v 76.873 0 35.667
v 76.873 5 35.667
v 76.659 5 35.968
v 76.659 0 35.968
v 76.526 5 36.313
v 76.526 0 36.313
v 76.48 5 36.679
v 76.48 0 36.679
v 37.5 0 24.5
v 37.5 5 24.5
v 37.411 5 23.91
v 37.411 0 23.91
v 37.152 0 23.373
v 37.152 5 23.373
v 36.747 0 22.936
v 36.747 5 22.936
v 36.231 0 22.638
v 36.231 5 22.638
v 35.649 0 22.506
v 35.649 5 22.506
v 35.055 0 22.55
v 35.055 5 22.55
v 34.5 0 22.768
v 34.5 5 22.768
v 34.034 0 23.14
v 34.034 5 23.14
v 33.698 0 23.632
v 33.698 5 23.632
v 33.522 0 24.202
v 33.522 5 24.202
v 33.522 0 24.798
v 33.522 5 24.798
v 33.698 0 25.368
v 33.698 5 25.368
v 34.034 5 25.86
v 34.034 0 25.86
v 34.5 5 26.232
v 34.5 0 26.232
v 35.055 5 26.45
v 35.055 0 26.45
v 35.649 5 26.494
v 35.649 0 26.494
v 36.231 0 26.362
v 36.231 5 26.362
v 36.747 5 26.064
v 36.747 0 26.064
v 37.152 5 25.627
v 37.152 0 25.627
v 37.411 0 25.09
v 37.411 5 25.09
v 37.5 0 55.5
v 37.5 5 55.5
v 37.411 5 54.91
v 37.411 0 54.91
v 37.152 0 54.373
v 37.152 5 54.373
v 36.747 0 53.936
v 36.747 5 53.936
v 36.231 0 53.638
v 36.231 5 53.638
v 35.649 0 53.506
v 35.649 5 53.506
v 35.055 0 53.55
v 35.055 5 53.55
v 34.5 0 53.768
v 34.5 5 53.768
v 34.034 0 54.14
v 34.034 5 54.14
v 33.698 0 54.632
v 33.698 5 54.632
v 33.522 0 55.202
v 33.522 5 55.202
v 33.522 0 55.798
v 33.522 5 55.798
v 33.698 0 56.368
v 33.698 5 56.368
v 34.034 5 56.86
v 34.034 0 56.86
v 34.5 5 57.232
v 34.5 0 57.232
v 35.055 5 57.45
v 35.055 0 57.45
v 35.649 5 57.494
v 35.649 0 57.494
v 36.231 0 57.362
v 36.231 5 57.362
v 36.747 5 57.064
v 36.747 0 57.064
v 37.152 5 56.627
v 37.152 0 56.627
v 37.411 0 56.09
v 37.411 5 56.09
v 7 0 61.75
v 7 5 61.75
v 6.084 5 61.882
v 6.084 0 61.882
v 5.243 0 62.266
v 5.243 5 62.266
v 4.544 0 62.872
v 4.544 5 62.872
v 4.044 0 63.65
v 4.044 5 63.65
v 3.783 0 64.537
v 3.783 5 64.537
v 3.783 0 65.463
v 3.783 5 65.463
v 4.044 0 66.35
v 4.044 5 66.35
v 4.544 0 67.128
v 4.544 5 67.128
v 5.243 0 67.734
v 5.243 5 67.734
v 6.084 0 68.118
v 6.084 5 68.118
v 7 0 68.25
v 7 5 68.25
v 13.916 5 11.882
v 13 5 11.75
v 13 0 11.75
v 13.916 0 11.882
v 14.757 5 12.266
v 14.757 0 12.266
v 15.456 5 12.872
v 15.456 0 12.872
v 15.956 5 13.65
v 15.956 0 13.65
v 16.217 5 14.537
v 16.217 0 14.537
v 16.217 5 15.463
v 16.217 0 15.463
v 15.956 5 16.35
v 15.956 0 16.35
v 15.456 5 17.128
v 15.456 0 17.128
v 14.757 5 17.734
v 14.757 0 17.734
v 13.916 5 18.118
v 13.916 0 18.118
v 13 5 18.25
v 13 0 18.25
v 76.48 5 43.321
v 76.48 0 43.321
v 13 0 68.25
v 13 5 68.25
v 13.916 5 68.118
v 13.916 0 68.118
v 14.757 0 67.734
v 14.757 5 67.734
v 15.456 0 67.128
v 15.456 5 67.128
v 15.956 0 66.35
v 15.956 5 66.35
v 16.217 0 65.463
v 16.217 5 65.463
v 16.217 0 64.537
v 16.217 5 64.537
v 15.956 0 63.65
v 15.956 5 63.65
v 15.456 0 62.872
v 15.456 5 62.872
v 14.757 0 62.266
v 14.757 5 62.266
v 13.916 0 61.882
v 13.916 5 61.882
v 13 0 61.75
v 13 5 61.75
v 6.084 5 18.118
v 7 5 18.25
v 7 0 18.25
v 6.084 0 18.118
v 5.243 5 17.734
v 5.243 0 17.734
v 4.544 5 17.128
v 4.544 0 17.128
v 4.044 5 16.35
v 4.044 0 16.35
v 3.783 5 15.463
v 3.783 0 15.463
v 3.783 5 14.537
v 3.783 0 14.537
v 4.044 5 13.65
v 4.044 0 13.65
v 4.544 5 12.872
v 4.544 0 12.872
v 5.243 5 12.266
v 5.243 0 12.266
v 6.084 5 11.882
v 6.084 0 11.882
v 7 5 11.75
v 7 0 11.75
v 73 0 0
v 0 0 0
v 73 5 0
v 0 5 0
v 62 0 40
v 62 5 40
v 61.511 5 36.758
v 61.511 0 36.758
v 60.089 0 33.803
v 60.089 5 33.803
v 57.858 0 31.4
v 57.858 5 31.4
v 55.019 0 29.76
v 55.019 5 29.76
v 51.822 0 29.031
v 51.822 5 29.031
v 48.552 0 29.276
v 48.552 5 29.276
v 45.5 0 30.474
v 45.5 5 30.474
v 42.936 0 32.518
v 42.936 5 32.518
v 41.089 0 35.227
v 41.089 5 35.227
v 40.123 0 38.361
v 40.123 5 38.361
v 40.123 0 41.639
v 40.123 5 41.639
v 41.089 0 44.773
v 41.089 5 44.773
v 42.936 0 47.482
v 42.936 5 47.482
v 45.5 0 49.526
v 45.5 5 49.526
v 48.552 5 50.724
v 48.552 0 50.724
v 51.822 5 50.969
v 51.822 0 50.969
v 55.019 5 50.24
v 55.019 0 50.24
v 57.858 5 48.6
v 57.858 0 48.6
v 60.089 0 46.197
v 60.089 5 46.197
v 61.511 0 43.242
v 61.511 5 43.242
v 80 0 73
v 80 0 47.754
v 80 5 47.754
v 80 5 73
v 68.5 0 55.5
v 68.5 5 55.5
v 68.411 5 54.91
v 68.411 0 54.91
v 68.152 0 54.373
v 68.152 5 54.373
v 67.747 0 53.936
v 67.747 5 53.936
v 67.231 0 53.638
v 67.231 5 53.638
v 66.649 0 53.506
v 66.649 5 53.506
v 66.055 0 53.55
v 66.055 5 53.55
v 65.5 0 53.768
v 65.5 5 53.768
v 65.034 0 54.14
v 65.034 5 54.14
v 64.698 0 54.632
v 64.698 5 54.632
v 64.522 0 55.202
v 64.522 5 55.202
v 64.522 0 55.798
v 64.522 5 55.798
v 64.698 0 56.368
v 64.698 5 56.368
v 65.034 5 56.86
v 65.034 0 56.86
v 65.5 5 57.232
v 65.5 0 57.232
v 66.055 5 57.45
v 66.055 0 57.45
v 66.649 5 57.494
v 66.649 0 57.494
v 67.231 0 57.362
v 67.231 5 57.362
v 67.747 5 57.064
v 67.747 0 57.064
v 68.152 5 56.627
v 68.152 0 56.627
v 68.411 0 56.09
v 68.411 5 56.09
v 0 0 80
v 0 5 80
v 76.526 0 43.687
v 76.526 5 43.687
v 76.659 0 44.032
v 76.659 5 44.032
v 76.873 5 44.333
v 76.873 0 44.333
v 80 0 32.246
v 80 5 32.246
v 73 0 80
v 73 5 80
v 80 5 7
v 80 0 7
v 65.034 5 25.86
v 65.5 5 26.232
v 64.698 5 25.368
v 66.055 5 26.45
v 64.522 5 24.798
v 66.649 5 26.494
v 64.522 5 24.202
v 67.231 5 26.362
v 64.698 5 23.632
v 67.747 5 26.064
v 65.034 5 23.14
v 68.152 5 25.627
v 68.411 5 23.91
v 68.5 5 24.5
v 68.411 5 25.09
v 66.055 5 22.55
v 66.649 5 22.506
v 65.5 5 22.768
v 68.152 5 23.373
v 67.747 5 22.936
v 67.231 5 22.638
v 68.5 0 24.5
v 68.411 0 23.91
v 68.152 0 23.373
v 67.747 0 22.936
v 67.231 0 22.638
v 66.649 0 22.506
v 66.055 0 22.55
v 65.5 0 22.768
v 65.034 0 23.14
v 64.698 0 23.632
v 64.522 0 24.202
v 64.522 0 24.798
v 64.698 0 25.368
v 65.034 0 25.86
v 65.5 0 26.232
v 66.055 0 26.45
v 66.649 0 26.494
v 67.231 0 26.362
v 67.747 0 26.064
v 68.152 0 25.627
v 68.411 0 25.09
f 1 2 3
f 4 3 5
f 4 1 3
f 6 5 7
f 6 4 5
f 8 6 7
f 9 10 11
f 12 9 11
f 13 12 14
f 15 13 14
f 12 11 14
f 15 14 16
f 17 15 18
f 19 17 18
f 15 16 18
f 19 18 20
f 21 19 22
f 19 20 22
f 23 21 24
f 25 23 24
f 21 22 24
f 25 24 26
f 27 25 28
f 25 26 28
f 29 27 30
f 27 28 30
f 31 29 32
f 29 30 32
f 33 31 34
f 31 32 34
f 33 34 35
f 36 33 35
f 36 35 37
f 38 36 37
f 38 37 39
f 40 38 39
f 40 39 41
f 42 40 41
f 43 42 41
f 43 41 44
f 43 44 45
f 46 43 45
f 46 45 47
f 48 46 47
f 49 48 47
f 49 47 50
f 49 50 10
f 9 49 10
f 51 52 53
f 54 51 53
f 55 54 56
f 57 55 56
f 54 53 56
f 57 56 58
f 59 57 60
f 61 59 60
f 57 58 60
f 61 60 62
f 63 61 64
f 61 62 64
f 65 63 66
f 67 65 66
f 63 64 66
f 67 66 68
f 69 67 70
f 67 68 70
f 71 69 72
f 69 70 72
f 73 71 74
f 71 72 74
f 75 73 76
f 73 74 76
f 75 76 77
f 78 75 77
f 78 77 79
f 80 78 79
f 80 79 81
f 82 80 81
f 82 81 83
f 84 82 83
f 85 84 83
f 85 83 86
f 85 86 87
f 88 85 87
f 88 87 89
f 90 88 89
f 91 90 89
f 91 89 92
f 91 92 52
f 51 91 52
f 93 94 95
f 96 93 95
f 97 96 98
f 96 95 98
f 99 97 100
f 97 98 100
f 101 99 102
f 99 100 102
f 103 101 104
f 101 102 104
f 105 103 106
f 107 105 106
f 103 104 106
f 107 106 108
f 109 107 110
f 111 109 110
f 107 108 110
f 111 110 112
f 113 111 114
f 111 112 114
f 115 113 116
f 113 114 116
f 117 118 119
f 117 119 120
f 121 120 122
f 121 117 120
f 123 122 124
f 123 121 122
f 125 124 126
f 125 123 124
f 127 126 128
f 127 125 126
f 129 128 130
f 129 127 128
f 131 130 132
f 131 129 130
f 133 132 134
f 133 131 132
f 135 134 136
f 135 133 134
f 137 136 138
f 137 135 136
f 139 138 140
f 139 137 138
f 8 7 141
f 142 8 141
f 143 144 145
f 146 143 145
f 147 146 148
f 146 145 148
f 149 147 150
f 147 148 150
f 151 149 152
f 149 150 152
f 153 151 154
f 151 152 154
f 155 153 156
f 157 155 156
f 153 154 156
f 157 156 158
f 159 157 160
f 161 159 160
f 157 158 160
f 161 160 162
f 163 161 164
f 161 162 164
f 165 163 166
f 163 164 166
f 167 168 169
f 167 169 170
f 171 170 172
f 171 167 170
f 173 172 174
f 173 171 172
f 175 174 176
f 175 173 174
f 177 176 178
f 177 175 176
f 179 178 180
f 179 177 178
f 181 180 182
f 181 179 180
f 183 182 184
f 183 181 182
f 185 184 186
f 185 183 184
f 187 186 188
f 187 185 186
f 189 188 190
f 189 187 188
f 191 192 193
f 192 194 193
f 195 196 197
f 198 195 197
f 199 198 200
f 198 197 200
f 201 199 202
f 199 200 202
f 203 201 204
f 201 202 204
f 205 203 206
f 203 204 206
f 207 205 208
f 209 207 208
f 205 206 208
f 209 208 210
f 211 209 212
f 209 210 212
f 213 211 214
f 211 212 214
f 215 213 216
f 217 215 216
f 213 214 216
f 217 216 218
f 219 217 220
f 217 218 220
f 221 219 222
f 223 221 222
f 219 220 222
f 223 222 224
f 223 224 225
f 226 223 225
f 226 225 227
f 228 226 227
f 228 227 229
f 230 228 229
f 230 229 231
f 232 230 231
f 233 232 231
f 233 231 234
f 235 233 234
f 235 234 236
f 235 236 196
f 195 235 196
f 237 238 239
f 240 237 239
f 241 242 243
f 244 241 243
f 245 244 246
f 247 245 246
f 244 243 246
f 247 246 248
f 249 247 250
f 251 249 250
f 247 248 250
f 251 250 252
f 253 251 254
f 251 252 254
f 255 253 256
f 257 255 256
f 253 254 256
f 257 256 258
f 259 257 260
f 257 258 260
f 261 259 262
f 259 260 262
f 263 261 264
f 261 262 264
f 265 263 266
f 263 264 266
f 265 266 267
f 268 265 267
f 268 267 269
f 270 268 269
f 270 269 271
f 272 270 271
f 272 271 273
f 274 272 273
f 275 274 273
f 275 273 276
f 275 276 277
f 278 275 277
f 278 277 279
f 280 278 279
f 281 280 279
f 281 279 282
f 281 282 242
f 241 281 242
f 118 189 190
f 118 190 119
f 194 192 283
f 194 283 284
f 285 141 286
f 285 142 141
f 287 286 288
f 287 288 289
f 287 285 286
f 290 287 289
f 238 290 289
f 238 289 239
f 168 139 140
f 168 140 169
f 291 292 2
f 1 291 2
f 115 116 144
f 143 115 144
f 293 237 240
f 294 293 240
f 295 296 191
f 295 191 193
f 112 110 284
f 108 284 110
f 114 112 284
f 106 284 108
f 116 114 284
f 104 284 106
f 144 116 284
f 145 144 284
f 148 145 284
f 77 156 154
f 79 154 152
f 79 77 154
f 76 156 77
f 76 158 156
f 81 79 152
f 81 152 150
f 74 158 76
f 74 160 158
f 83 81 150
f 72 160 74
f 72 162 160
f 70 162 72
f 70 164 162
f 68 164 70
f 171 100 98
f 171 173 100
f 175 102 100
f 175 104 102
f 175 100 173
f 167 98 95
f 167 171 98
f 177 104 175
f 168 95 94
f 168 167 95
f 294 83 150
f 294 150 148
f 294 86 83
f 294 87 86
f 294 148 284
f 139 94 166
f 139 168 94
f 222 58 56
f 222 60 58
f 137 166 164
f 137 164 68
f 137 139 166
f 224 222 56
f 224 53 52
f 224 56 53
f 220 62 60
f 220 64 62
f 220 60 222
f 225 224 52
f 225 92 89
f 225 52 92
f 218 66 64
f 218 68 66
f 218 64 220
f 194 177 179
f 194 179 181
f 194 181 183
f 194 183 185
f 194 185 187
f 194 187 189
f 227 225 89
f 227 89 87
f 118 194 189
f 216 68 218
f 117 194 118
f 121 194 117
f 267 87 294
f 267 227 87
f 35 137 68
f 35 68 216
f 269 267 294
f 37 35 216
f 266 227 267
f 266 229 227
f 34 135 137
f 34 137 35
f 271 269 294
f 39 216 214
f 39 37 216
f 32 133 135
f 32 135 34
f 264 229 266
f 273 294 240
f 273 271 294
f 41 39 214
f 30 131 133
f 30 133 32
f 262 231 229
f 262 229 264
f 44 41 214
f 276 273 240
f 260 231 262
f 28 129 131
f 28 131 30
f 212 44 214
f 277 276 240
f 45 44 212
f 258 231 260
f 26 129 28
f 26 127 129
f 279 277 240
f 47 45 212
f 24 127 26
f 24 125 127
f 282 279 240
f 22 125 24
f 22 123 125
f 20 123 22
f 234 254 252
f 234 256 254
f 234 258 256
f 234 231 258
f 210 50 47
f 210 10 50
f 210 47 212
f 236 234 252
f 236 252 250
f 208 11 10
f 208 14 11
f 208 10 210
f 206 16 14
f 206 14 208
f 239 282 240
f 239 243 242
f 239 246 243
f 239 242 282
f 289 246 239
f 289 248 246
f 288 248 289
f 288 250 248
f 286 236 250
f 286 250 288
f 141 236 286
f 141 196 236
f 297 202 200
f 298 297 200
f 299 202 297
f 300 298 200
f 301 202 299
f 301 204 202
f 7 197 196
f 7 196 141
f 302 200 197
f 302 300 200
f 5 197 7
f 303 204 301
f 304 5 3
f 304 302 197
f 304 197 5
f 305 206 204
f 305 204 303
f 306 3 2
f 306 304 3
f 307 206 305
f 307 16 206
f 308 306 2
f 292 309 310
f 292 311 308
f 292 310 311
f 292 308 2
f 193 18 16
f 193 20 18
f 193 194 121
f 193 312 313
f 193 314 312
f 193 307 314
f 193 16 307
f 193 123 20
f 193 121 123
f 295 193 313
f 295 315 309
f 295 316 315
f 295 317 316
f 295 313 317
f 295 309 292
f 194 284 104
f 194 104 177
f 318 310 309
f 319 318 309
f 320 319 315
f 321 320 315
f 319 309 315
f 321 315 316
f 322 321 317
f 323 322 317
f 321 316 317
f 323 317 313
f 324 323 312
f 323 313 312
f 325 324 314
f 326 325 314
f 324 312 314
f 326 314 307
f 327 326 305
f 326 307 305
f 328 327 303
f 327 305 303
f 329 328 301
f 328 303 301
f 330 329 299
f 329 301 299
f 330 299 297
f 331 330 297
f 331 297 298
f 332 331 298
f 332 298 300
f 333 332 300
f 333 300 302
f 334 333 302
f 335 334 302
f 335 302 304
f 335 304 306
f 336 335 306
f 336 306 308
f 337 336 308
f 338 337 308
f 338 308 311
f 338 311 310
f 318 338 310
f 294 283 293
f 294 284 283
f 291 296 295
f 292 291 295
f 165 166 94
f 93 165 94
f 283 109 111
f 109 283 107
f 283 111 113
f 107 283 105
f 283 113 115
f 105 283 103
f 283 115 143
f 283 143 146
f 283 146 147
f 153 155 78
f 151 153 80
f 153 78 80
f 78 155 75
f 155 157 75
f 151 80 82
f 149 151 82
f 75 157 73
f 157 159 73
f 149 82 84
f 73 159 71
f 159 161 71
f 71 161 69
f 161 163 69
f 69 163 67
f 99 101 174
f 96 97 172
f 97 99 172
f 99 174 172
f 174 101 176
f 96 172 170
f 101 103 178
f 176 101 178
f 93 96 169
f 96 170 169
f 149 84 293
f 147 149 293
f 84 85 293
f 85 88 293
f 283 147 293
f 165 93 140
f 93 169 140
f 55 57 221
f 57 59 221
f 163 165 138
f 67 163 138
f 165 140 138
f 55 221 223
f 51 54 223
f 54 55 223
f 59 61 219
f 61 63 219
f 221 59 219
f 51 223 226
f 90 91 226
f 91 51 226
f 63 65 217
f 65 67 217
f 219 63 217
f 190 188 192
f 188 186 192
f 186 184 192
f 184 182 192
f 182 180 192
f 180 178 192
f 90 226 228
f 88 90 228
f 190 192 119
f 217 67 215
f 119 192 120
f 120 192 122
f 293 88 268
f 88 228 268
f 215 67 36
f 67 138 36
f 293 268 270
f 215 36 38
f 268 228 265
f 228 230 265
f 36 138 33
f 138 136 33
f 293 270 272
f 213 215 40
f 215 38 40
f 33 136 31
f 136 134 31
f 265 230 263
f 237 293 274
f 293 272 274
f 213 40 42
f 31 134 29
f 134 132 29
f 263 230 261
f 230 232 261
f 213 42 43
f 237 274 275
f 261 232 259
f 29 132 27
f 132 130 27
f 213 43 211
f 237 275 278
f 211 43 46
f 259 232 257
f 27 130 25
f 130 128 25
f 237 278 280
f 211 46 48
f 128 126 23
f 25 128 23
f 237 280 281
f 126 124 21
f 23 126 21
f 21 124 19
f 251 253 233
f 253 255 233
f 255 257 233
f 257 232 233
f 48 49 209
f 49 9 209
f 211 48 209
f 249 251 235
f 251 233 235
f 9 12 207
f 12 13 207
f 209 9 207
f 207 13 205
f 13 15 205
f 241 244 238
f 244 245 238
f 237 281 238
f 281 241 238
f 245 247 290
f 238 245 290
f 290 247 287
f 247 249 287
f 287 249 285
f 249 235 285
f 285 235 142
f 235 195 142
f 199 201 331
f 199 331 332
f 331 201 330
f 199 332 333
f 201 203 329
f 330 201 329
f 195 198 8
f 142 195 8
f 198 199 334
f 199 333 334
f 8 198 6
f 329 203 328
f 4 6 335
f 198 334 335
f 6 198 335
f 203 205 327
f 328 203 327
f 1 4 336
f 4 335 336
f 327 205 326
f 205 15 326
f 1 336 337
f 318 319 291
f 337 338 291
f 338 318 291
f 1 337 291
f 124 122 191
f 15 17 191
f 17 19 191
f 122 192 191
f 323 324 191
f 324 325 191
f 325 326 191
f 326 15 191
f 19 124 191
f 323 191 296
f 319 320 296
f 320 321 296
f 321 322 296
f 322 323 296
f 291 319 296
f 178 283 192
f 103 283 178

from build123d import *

# Parameters (mm, degrees)
SCHIZZO1_W                   = 80
SCHIZZO1_H                   = 5
ESTRUSIONE_ESTRUSIONE1_DEPTH = 80
SCHIZZO4_R                   = 11
TAGLIO_ESTRUSIONE1_DEPTH     = 6
SCHIZZO6_R                   = 2
TAGLIO_ESTRUSIONE3_DEPTH     = 6
CHAMFER1_SIZE                = 7
CUT_EXTRUDE1_DEPTH           = 6
CUT_EXTRUDE2_DEPTH           = 6
FILLET1_R                    = 1.5
FILLET2_R                    = 1.5


with BuildPart() as part:
    # Schizzo1 → Estrusione-Estrusione1 (new body)
    with BuildSketch(Plane.XY):
        with Locations((40, 2.5)):
            Rectangle(SCHIZZO1_W, SCHIZZO1_H)
    extrude(amount=ESTRUSIONE_ESTRUSIONE1_DEPTH)

    # Schizzo4 → Taglio-Estrusione1 (cut, through all)
    with BuildSketch(Plane(origin=(0, 5, 0), x_dir=(1, 0, 0), z_dir=(0, 1, 0))):
        with Locations((51, -40)):
            Circle(SCHIZZO4_R)
    extrude(amount=-TAGLIO_ESTRUSIONE1_DEPTH, mode=Mode.SUBTRACT)

    # Schizzo6 → Taglio-Estrusione3 (cut, through all)
    with BuildSketch(Plane(origin=(0, 5, 0), x_dir=(1, 0, 0), z_dir=(0, 1, 0))):
        with Locations((35.5, -24.5)):
            Circle(SCHIZZO6_R)
        with Locations((66.5, -24.5)):
            Circle(SCHIZZO6_R)
        with Locations((66.5, -55.5)):
            Circle(SCHIZZO6_R)
        with Locations((35.5, -55.5)):
            Circle(SCHIZZO6_R)
    extrude(amount=-TAGLIO_ESTRUSIONE3_DEPTH, mode=Mode.SUBTRACT)

    # Chamfer1
    chamfer1_edges = [part.edges().sort_by_distance(p)[0] for p in [
        (80, 2.5, 80),
        (80, 2.5, 0),
    ]]
    chamfer(chamfer1_edges, length=CHAMFER1_SIZE)

    # Sketch1 → Cut-Extrude1 (cut, through all)
    with BuildSketch(Plane(origin=(0, 5, 0), x_dir=(1, 0, 0), z_dir=(0, 1, 0))):
        with BuildLine():
            Line((7, -11.75), (13, -11.75))
            ThreePointArc((13, -11.75), (16.25, -15), (13, -18.25))
            Line((13, -18.25), (7, -18.25))
            ThreePointArc((7, -18.25), (3.75, -15), (7, -11.75))
        make_face()
        with BuildLine():
            Line((7, -68.25), (13, -68.25))
            ThreePointArc((13, -68.25), (16.25, -65), (13, -61.75))
            Line((13, -61.75), (7, -61.75))
            ThreePointArc((7, -61.75), (3.75, -65), (7, -68.25))
        make_face()
    extrude(amount=-CUT_EXTRUDE1_DEPTH, mode=Mode.SUBTRACT)

    # Sketch2 → Cut-Extrude2 (cut, through all)
    with BuildSketch(Plane(origin=(0, 5, 0), x_dir=(1, 0, 0), z_dir=(0, 1, 0))):
        Polygon((80, -32.245982949), (76.480308406, -36.096971283), (76.480308406, -43.903028717), (80, -47.754017051), align=None)
    extrude(amount=-CUT_EXTRUDE2_DEPTH, mode=Mode.SUBTRACT)

    # Fillet1
    fillet1_edges = [part.edges().sort_by_distance(p)[0] for p in [
        (76.480308406, 2.5, 36.096971283),
    ]]
    fillet(fillet1_edges, radius=FILLET1_R)

    # Fillet2
    fillet2_edges = [part.edges().sort_by_distance(p)[0] for p in [
        (76.480308406, 2.5, 43.903028717),
    ]]
    fillet(fillet2_edges, radius=FILLET2_R)


solid = part.part
